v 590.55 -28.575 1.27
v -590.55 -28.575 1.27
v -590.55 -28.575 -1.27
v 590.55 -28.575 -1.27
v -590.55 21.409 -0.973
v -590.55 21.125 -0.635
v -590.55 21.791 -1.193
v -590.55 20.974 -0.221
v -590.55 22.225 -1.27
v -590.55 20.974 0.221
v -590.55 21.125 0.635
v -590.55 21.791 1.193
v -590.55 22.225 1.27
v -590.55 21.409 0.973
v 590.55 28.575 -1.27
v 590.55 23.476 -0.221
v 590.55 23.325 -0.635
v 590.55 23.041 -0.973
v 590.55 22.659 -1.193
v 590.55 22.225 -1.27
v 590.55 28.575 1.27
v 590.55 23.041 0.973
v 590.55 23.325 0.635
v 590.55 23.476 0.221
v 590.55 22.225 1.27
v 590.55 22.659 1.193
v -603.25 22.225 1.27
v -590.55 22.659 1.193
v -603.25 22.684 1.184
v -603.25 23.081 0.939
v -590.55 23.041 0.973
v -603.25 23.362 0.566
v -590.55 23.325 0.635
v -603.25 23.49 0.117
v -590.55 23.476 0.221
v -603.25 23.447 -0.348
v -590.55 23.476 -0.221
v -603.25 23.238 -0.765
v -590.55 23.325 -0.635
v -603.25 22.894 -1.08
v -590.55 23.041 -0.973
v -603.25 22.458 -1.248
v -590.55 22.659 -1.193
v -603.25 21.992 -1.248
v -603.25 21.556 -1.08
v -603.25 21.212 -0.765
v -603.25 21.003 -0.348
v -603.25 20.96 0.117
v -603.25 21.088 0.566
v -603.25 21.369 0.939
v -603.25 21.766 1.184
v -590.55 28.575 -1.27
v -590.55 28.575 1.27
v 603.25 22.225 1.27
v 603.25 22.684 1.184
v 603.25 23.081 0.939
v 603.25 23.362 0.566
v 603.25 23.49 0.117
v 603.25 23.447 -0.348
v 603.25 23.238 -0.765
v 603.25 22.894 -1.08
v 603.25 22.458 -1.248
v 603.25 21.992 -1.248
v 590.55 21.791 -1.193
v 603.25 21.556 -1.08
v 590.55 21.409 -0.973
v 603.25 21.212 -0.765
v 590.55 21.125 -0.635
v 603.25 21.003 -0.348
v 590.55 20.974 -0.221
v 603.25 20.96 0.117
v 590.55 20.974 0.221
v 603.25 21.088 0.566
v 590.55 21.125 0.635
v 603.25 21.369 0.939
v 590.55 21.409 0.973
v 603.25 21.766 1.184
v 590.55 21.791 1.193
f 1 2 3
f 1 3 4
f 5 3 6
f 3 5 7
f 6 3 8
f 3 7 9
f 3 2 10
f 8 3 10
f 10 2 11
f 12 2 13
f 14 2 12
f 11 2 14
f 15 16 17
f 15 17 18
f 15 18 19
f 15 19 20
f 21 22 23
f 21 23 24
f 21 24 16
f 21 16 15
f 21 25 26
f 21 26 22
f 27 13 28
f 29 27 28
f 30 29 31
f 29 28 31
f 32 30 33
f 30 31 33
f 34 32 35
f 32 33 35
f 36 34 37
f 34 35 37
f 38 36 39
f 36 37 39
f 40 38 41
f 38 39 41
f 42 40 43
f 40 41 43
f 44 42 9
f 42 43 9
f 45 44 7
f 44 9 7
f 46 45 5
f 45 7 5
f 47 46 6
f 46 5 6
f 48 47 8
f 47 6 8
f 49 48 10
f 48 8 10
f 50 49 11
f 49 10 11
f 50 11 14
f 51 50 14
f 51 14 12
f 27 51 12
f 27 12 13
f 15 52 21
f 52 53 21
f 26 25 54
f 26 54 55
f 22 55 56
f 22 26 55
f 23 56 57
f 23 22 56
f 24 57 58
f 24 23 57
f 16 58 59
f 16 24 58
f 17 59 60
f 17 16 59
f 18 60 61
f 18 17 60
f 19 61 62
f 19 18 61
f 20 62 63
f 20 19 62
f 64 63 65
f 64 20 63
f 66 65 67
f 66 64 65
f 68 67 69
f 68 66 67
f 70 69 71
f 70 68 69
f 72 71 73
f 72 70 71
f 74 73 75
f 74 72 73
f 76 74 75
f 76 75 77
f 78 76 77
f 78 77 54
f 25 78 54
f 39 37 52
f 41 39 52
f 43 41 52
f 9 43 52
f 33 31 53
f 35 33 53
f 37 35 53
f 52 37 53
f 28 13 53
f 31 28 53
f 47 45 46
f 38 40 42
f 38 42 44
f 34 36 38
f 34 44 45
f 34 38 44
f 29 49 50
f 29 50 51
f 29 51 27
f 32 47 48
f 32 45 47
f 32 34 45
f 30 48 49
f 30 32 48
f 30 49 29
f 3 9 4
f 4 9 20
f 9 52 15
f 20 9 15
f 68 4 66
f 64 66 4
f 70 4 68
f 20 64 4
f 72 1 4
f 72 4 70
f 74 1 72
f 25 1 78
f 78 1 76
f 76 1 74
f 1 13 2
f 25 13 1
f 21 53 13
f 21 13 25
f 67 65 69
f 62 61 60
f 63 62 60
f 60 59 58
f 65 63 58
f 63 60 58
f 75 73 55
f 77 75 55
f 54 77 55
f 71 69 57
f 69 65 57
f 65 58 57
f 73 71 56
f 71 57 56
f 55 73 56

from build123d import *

# Parameters (mm, degrees)
SKETCH1_W                = 1181.1
SKETCH1_H                = 57.15
BOSS_EXTRUDE1_DEPTH      = 1.27
SKETCH2_R                = 1.27
BOSS_EXTRUDE2_DEPTH      = 12.7
BOSS_EXTRUDE2_DEPTH_BACK = 1193.8


with BuildPart() as part:
    # Sketch1 → Boss-Extrude1 (new body, symmetric)
    with BuildSketch(Plane.XY):
        Rectangle(SKETCH1_W, SKETCH1_H)
    extrude(amount=BOSS_EXTRUDE1_DEPTH, both=True)

    # Sketch2 → Boss-Extrude2 (add, two sides)
    with BuildSketch(Plane.ZY.offset(590.55)) as boss_extrude2_sk:
        with Locations((0, 22.225)):
            Circle(SKETCH2_R)
    extrude(amount=BOSS_EXTRUDE2_DEPTH)
    extrude(boss_extrude2_sk.sketch, amount=-BOSS_EXTRUDE2_DEPTH_BACK)


solid = part.part
